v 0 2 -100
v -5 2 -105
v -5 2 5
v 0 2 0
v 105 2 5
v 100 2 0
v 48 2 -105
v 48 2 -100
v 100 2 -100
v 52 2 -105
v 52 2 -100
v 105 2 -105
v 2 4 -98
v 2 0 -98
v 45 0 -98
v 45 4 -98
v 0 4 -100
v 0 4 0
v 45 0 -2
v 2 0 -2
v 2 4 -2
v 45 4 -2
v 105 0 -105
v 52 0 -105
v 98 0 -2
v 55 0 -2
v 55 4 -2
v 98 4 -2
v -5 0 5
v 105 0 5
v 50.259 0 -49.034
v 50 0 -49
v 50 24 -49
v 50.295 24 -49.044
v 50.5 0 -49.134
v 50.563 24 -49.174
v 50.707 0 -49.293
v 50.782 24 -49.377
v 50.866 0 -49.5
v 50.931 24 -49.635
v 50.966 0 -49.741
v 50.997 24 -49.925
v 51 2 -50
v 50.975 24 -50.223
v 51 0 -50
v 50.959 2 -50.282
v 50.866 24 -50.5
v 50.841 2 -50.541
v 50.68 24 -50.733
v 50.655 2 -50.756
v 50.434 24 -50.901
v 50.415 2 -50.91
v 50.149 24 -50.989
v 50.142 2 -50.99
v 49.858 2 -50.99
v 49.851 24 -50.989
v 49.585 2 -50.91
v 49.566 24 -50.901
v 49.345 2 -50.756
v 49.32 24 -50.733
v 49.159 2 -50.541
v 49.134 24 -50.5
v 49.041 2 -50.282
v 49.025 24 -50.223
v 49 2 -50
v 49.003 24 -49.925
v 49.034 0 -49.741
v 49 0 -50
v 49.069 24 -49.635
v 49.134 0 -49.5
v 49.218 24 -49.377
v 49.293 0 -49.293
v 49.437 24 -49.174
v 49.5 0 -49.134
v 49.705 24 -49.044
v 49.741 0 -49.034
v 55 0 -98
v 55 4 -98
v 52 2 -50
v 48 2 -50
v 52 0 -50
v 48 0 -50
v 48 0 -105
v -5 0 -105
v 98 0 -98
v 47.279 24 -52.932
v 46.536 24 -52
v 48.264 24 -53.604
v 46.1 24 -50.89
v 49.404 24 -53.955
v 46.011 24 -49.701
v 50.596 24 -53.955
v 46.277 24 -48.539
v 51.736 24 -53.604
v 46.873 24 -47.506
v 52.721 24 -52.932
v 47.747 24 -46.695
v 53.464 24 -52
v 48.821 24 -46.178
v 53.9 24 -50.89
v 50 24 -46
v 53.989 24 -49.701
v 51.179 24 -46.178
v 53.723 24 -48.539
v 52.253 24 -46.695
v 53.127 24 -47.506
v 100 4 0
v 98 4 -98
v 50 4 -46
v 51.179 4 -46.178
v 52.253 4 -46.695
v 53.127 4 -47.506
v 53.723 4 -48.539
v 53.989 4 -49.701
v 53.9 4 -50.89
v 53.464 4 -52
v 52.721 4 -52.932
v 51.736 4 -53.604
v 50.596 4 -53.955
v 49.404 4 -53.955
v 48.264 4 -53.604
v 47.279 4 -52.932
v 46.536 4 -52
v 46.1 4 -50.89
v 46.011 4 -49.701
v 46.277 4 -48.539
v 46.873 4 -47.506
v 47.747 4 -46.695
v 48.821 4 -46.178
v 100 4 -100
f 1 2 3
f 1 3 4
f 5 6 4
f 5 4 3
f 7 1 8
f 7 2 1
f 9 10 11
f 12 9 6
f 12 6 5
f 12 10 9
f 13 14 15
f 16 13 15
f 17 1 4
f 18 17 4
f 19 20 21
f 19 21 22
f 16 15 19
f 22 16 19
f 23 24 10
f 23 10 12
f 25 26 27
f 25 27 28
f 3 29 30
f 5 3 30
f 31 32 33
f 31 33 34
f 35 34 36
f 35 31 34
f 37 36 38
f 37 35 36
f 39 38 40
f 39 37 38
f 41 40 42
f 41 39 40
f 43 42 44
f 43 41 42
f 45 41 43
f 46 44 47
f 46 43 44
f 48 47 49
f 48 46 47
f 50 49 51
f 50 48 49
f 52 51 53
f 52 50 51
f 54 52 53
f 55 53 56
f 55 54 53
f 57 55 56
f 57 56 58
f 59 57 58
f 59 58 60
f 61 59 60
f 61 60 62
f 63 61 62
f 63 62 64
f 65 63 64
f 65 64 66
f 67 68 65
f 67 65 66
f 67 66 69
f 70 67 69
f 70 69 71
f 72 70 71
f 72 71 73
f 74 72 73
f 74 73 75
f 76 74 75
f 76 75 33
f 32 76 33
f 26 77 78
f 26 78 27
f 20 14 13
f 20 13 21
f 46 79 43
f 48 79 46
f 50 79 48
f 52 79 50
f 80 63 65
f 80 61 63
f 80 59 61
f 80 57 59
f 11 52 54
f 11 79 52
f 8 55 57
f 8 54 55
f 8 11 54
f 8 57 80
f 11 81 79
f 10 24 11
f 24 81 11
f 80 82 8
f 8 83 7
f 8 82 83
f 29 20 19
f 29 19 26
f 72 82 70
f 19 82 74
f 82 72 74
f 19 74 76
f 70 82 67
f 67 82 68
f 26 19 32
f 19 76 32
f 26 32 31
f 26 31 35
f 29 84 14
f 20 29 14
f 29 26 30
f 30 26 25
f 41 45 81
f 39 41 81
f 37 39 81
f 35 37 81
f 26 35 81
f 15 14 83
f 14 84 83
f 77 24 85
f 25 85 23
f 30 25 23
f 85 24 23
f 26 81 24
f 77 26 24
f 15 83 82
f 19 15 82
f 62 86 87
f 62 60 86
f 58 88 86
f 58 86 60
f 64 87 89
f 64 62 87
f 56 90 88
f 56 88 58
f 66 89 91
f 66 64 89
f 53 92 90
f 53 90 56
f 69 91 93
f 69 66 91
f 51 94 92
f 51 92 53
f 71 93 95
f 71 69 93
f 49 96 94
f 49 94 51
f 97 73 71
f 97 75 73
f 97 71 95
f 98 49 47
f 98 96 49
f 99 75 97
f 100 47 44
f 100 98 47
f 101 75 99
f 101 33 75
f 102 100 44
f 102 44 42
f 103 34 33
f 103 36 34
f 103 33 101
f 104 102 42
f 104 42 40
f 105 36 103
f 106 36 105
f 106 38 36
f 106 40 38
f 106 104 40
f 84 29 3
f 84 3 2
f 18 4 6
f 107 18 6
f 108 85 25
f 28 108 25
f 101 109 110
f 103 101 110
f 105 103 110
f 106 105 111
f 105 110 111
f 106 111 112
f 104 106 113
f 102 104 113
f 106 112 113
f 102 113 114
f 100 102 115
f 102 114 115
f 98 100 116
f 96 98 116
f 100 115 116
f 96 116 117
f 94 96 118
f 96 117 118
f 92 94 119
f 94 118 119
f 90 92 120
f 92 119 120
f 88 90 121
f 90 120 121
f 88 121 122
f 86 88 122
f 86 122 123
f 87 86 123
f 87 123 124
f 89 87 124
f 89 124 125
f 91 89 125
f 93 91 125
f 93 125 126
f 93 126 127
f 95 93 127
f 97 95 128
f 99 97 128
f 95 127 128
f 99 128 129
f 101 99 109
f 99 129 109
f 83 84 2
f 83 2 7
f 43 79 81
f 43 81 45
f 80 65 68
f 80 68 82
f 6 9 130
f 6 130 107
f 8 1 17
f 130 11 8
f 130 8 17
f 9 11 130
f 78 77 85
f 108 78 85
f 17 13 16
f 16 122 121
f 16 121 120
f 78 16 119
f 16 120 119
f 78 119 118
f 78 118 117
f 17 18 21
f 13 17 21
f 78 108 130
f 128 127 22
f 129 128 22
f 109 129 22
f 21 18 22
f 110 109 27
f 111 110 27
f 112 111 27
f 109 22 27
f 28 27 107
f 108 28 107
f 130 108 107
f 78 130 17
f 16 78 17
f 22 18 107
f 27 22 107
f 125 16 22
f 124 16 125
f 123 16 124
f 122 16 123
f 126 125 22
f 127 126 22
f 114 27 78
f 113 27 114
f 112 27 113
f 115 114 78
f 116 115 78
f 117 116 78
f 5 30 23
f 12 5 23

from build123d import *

# Parameters (mm, degrees)
CROQUIS1_W              = 110
CROQUIS1_H              = 110
CROQUIS1_W_2            = 100
CROQUIS1_H_2            = 100
SALIENTE_EXTRUIR1_DEPTH = 2
CROQUIS2_W              = 100
CROQUIS2_H              = 100
CROQUIS2_W_2            = 96
CROQUIS2_H_2            = 96
SALIENTE_EXTRUIR2_DEPTH = 4
CROQUIS3_W              = 10
CROQUIS3_H              = 96
SALIENTE_EXTRUIR3_DEPTH = 4
CROQUIS4_R              = 4
CROQUIS4_R_2            = 1
SALIENTE_EXTRUIR4_DEPTH = 20
CORTAR_EXTRUIR1_START   = -20
CROQUIS5_R              = 1
CORTAR_EXTRUIR1_DEPTH   = 20
CROQUIS6_W              = 4
CROQUIS6_H              = 2
CORTAR_EXTRUIR4_DEPTH   = 55


with BuildPart() as part:
    # Croquis1 → Saliente-Extruir1 (new body)
    with BuildSketch(Plane(origin=(0, 0, 0), x_dir=(1, 0, 0), z_dir=(0, 1, 0))):
        with Locations((50, 50)):
            Rectangle(CROQUIS1_W, CROQUIS1_H)
        with Locations((50, 50)):
            Rectangle(CROQUIS1_W_2, CROQUIS1_H_2, mode=Mode.SUBTRACT)
    extrude(amount=SALIENTE_EXTRUIR1_DEPTH)

    # Croquis2 → Saliente-Extruir2 (add)
    with BuildSketch(Plane.XZ):
        with Locations((50, -50)):
            Rectangle(CROQUIS2_W, CROQUIS2_H)
        with Locations((50, -50)):
            Rectangle(CROQUIS2_W_2, CROQUIS2_H_2, mode=Mode.SUBTRACT)
    extrude(amount=-SALIENTE_EXTRUIR2_DEPTH)

    # Croquis3 → Saliente-Extruir3 (add)
    with BuildSketch(Plane.XZ):
        with Locations((50, -50)):
            Rectangle(CROQUIS3_W, CROQUIS3_H)
    extrude(amount=-SALIENTE_EXTRUIR3_DEPTH)

    # Croquis4 → Saliente-Extruir4 (add)
    with BuildSketch(Plane(origin=(0, 4, 0), x_dir=(1, 0, 0), z_dir=(0, 1, 0))):
        with Locations(Location((50, 50, 0), (0, 0, 270))):
            Circle(CROQUIS4_R)
        with Locations(Location((50, 50, 0), (0, 0, 270))):
            Circle(CROQUIS4_R_2, mode=Mode.SUBTRACT)
    extrude(amount=SALIENTE_EXTRUIR4_DEPTH)

    # Croquis5 → Cortar-Extruir1 (cut)
    with BuildSketch(Plane(origin=(0, 4, 0), x_dir=(1, 0, 0), z_dir=(0, 1, 0)).offset(CORTAR_EXTRUIR1_START)):
        with Locations(Location((50, 50, 0), (0, 0, 270))):
            Circle(CROQUIS5_R)
    extrude(amount=CORTAR_EXTRUIR1_DEPTH, mode=Mode.SUBTRACT)

    # Croquis6 → Cortar-Extruir4 (cut)
    with BuildSketch(Plane(origin=(0, 0, -105), x_dir=(-1, 0, 0), z_dir=(0, 0, -1))):
        with Locations((-50, 1)):
            Rectangle(CROQUIS6_W, CROQUIS6_H)
    extrude(amount=-CORTAR_EXTRUIR4_DEPTH, mode=Mode.SUBTRACT)


solid = part.part
